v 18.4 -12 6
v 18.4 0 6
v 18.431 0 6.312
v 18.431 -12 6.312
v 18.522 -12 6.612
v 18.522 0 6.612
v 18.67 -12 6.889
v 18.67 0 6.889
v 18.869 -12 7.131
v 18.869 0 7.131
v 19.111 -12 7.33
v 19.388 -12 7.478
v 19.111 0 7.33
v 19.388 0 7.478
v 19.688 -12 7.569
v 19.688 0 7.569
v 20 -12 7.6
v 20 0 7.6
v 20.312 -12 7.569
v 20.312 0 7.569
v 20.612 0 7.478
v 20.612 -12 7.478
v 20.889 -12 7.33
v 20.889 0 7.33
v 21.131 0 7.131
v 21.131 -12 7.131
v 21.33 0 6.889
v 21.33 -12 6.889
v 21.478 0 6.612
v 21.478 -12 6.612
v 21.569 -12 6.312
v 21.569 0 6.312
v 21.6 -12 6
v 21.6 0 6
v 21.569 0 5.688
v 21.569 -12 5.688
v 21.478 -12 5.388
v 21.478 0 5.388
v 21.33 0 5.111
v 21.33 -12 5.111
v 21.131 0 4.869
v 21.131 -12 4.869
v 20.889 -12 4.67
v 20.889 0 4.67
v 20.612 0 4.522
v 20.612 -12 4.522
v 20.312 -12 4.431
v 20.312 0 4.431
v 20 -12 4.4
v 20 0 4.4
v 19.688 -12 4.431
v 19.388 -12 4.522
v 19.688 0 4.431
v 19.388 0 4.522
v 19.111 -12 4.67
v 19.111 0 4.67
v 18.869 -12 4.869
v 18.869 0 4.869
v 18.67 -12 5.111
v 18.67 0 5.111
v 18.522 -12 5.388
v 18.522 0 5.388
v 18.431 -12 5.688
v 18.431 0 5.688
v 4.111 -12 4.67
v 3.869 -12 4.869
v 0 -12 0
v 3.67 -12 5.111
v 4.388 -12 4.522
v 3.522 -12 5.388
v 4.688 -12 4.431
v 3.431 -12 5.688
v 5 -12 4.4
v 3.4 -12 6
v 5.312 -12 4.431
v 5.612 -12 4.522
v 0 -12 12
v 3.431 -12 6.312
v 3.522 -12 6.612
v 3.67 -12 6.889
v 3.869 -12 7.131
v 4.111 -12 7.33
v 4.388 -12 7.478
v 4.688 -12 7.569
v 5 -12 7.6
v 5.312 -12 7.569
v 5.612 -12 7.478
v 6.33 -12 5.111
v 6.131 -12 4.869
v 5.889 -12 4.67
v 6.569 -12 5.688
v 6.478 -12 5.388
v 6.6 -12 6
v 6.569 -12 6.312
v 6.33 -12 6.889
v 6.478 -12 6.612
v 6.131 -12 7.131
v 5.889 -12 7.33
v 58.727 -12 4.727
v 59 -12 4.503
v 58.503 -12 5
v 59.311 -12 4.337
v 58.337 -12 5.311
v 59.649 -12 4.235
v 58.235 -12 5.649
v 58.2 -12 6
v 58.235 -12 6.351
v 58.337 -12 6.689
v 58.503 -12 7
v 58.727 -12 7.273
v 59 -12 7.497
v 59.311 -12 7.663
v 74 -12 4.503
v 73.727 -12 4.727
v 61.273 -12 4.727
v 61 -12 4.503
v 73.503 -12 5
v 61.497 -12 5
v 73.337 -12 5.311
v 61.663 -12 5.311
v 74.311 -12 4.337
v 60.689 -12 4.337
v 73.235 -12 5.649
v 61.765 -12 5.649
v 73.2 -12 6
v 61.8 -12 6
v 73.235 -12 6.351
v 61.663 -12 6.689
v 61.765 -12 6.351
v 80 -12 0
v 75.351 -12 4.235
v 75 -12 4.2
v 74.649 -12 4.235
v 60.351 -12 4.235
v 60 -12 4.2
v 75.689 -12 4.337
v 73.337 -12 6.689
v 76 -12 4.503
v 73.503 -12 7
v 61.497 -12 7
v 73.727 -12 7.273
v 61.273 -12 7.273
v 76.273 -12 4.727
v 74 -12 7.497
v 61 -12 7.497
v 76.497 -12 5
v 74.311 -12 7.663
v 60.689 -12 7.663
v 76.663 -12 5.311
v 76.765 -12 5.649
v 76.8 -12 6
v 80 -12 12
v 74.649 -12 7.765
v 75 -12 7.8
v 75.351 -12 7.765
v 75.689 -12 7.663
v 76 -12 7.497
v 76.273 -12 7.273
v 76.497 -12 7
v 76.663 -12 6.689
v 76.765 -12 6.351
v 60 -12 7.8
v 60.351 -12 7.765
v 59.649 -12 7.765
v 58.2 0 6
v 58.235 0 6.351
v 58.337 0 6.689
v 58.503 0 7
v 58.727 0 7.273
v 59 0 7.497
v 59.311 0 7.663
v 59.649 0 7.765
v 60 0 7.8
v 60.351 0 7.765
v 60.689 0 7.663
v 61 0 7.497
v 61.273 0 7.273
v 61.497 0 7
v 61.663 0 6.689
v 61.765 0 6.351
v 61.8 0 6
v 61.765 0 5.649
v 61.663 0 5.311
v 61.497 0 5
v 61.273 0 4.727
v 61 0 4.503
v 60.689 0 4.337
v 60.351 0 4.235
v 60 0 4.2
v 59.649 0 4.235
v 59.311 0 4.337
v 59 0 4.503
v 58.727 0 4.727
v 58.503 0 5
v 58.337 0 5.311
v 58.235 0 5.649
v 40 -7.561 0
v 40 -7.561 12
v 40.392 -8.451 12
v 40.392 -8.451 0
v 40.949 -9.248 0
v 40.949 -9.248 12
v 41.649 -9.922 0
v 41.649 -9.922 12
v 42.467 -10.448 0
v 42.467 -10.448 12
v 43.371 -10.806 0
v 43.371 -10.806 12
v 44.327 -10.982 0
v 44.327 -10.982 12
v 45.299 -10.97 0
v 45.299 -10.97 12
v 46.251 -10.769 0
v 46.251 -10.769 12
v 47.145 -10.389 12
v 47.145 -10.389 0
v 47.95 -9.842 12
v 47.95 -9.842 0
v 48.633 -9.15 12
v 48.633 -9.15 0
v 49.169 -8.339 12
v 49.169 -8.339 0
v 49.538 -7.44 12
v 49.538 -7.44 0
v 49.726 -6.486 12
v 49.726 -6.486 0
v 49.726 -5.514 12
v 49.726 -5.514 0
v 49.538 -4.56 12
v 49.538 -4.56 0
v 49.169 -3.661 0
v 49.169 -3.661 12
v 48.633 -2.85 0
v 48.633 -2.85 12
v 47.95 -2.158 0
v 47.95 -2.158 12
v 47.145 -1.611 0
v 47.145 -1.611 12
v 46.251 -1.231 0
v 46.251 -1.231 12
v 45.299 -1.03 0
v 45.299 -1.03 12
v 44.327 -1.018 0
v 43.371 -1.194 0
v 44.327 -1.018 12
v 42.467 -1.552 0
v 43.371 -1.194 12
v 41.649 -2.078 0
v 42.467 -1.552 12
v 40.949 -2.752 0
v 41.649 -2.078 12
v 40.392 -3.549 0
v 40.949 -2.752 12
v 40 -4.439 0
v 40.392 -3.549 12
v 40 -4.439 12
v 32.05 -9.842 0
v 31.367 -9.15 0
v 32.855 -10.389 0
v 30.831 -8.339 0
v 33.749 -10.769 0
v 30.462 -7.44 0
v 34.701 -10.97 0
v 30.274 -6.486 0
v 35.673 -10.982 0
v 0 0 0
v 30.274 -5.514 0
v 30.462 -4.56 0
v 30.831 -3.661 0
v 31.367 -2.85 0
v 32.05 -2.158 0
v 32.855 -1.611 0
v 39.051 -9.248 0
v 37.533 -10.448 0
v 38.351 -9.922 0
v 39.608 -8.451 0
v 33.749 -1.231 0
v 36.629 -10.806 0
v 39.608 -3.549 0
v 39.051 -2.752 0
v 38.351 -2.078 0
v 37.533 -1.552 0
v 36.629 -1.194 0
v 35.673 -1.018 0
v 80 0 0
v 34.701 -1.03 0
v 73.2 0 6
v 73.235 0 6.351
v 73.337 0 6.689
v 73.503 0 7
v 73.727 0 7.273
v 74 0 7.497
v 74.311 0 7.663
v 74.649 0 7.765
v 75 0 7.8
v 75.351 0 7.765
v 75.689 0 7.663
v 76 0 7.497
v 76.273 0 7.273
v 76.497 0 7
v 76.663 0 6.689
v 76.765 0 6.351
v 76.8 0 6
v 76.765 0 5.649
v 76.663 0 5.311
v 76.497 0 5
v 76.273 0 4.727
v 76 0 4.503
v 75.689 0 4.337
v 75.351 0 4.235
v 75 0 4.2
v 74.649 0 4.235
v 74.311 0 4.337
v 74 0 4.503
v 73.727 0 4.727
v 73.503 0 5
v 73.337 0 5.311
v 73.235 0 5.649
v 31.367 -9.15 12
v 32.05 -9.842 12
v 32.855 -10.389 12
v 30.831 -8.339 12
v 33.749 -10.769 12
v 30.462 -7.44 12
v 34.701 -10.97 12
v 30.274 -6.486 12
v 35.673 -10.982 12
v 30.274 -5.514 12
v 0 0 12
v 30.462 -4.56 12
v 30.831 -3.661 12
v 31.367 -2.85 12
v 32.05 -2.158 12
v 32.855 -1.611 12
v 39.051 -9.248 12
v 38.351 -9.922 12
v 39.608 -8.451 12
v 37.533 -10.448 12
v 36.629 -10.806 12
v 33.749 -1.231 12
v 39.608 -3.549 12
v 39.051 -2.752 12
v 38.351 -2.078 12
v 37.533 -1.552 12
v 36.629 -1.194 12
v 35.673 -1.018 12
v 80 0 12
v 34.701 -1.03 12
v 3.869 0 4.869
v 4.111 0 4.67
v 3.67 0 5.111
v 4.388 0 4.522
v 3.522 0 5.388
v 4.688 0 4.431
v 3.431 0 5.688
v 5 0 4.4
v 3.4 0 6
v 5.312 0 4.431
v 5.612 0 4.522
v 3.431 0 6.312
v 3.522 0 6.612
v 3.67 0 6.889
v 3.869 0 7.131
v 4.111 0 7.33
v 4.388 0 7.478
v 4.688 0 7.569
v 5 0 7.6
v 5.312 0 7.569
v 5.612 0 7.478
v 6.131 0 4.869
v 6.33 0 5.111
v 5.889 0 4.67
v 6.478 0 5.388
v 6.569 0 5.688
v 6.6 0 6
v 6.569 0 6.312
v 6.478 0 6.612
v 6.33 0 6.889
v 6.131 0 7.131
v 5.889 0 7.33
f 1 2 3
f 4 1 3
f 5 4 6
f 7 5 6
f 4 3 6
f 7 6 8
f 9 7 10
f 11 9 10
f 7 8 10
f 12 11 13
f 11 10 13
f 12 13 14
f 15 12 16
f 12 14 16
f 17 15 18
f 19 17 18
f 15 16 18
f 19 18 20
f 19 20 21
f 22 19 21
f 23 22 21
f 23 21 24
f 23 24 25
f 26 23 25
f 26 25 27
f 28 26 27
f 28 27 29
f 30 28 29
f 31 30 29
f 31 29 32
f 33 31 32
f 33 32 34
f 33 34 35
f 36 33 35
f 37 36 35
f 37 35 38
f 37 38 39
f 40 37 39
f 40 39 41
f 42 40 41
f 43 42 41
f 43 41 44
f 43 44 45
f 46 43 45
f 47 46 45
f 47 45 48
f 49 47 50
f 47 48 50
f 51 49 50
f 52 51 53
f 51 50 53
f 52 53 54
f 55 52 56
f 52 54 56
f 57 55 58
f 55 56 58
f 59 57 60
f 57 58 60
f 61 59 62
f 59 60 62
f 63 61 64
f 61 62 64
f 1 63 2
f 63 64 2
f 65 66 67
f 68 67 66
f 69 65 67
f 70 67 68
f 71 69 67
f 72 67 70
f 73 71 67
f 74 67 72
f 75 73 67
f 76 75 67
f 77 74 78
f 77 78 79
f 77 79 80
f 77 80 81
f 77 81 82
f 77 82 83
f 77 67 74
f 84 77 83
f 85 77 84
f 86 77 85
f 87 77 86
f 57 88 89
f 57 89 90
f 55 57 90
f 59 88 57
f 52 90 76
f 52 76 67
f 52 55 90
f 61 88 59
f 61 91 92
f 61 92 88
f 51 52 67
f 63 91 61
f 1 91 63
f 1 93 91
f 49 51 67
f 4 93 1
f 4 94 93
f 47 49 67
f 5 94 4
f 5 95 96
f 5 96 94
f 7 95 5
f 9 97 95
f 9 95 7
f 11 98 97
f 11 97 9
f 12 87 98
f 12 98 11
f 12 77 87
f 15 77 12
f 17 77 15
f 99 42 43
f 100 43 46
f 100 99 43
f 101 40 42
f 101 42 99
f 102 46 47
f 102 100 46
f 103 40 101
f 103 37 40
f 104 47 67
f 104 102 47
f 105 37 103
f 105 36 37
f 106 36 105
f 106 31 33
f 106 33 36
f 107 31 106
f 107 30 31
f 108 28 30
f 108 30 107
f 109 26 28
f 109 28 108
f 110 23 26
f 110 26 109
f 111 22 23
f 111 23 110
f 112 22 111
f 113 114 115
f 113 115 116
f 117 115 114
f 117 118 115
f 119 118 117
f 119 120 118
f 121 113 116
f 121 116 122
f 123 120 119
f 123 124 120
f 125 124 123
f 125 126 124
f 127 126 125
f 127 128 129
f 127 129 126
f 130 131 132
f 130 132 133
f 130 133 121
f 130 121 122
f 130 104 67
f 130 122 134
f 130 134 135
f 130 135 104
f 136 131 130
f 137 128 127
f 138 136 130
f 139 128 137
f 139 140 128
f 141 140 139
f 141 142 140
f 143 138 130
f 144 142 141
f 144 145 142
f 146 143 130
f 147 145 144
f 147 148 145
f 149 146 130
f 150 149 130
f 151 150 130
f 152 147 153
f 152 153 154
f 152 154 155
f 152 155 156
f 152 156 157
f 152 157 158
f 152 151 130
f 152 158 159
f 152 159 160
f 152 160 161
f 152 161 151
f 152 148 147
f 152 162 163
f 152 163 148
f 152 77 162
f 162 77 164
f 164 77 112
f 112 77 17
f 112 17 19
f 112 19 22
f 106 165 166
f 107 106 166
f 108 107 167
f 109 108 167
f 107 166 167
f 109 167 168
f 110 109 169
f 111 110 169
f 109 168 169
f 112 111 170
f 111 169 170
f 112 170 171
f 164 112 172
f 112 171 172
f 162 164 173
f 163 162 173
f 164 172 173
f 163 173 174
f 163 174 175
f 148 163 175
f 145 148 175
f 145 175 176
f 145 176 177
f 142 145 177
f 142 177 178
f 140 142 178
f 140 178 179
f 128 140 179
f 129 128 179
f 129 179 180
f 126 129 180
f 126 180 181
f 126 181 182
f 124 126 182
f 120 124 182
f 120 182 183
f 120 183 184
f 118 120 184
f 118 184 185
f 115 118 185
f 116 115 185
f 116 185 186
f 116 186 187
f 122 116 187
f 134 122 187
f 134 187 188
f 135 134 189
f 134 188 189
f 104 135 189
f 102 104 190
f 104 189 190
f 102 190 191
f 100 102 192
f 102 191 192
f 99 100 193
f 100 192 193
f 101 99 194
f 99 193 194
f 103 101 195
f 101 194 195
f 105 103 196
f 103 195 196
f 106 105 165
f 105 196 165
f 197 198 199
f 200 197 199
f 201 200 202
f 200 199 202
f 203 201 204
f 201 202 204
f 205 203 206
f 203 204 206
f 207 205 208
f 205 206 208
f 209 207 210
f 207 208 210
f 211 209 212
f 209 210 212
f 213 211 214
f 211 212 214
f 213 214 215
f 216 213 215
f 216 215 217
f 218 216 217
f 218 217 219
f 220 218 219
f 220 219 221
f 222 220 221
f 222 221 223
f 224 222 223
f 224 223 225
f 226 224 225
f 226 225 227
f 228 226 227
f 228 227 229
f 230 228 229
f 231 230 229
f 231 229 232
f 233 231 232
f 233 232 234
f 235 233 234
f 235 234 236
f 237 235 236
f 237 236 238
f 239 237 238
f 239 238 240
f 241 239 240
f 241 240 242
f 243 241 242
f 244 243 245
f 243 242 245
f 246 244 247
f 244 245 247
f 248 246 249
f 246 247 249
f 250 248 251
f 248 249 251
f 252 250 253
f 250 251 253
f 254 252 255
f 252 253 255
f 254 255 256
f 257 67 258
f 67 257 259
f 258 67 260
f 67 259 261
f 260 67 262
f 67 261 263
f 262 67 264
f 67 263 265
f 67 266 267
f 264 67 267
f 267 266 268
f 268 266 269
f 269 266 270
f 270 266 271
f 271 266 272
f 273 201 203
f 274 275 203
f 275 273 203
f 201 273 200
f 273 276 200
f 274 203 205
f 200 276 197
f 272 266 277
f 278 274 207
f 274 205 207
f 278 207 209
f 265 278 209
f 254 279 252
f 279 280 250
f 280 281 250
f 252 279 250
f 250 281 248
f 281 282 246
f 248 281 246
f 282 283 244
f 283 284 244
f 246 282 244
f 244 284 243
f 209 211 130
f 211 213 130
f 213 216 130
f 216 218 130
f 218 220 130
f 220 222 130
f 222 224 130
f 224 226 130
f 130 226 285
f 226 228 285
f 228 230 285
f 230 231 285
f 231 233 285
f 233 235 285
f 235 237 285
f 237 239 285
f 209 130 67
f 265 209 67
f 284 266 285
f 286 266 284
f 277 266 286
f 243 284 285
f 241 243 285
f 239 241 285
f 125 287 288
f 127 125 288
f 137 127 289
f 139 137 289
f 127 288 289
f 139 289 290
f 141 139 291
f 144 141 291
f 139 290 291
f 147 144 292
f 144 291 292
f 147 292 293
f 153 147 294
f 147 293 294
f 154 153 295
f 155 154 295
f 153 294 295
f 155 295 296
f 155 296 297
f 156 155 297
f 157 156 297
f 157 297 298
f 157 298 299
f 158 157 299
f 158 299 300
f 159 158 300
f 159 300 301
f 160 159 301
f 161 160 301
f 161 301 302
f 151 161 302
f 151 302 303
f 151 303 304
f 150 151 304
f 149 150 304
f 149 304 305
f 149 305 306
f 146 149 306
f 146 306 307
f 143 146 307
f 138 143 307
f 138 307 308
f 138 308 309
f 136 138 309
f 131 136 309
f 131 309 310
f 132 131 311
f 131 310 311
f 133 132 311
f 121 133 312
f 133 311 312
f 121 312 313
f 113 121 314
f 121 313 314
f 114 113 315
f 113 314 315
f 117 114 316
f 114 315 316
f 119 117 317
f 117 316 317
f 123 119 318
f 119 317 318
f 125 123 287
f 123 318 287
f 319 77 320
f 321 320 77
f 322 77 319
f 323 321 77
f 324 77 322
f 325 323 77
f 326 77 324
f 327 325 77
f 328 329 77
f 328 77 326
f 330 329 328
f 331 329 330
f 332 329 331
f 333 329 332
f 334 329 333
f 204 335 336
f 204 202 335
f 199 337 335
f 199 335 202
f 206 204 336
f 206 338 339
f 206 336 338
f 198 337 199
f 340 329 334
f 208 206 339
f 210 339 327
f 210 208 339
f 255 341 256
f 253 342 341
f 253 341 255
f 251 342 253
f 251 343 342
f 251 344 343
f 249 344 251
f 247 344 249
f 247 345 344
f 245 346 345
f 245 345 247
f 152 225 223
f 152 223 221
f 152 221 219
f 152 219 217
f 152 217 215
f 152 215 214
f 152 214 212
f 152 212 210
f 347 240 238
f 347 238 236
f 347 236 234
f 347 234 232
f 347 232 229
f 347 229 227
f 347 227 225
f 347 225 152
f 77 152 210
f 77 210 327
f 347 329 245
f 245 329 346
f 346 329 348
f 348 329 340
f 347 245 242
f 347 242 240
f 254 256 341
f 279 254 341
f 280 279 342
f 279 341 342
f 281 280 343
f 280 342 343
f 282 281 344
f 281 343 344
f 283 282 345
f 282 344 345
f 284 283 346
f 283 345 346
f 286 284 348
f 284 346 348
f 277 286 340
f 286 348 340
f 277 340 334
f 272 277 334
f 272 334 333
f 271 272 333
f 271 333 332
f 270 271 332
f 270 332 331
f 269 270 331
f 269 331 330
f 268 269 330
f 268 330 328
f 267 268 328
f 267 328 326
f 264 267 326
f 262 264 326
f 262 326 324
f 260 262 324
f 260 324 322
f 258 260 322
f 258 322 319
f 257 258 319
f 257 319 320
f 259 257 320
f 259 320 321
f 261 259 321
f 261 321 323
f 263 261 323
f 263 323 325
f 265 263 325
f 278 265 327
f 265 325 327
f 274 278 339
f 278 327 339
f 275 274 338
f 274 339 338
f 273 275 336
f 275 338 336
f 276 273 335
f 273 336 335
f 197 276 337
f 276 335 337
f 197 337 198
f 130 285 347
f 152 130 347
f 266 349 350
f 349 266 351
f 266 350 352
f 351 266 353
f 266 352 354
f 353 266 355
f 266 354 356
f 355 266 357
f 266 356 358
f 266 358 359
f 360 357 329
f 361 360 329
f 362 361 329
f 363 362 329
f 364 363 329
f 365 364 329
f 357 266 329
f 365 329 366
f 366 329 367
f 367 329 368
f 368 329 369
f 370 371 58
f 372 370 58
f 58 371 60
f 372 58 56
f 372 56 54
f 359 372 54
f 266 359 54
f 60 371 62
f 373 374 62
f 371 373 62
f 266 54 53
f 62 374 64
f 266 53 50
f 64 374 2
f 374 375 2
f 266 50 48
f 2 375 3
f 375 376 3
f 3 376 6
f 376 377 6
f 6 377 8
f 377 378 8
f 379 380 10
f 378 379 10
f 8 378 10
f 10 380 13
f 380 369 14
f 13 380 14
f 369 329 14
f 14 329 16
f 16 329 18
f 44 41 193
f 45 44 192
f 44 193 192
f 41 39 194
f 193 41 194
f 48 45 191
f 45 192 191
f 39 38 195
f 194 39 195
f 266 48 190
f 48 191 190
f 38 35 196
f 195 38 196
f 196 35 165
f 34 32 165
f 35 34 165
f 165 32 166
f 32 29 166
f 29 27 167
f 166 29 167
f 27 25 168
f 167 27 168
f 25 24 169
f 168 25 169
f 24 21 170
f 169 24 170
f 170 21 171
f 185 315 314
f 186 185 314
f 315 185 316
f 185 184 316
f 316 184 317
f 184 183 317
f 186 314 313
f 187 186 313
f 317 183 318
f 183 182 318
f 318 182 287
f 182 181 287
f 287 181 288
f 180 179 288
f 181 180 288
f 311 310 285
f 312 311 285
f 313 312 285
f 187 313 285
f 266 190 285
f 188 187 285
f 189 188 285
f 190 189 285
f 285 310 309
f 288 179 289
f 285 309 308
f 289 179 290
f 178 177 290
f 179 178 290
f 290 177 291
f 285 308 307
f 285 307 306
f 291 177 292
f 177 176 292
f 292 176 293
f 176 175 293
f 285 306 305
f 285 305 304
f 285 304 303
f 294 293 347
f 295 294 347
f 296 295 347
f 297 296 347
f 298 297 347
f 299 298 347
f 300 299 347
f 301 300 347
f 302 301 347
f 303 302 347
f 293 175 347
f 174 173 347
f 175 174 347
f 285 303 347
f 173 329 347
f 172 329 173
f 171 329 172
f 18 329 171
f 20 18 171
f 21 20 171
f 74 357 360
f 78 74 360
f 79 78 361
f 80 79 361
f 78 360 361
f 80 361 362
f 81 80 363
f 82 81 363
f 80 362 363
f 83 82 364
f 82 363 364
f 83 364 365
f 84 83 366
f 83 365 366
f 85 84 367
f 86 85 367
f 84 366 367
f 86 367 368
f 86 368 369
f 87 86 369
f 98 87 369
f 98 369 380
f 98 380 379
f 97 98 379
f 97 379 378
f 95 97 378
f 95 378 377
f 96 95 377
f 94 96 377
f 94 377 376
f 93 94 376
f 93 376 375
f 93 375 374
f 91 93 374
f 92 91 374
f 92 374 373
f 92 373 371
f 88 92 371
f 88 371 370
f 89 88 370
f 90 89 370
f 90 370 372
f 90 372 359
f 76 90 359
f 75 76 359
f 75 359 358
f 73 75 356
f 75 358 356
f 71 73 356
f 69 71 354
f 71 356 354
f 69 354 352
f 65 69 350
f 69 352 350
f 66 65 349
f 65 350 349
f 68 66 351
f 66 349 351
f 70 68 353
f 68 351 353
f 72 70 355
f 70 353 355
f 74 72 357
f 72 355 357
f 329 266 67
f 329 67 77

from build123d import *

# Parameters (mm, degrees)
F0_W     = 80
F0_H     = 12
F1_DEPTH = 12
F3_R     = 5
F4_DEPTH = 25
F2_R     = 5
F5_DEPTH = 25
F6_R     = 1.6
F6_R_2   = 1.8
F7_DEPTH = 25


with BuildPart() as f1:
    # F0 (on Front) → F1 (new body)
    with BuildSketch(Plane.XZ):
        with Locations((40, 6)):
            Rectangle(F0_W, F0_H)
    extrude(amount=F1_DEPTH)

    # F3 (on face) → F4 (cut)
    with BuildSketch(Plane.XY.offset(12)):
        with Locations((44.75, -6)):
            Circle(F3_R)
    extrude(amount=-F4_DEPTH, mode=Mode.SUBTRACT)

    # F2 (on face) → F5 (cut)
    with BuildSketch(Plane.XY.offset(12)):
        with Locations((35.25, -6)):
            Circle(F2_R)
    extrude(amount=-F5_DEPTH, mode=Mode.SUBTRACT)

    # F6 (on face) → F7 (cut)
    with BuildSketch(Plane(origin=(0, 0, 0), x_dir=(-1, 0, 0), z_dir=(0, 1, 0))):
        with Locations((-5, 6)):
            Circle(F6_R)
        with Locations((-20, 6)):
            Circle(F6_R)
        with Locations((-75, 6)):
            Circle(F6_R_2)
        with Locations((-60, 6)):
            Circle(F6_R_2)
    extrude(amount=-F7_DEPTH, mode=Mode.SUBTRACT)


solid = f1.part
